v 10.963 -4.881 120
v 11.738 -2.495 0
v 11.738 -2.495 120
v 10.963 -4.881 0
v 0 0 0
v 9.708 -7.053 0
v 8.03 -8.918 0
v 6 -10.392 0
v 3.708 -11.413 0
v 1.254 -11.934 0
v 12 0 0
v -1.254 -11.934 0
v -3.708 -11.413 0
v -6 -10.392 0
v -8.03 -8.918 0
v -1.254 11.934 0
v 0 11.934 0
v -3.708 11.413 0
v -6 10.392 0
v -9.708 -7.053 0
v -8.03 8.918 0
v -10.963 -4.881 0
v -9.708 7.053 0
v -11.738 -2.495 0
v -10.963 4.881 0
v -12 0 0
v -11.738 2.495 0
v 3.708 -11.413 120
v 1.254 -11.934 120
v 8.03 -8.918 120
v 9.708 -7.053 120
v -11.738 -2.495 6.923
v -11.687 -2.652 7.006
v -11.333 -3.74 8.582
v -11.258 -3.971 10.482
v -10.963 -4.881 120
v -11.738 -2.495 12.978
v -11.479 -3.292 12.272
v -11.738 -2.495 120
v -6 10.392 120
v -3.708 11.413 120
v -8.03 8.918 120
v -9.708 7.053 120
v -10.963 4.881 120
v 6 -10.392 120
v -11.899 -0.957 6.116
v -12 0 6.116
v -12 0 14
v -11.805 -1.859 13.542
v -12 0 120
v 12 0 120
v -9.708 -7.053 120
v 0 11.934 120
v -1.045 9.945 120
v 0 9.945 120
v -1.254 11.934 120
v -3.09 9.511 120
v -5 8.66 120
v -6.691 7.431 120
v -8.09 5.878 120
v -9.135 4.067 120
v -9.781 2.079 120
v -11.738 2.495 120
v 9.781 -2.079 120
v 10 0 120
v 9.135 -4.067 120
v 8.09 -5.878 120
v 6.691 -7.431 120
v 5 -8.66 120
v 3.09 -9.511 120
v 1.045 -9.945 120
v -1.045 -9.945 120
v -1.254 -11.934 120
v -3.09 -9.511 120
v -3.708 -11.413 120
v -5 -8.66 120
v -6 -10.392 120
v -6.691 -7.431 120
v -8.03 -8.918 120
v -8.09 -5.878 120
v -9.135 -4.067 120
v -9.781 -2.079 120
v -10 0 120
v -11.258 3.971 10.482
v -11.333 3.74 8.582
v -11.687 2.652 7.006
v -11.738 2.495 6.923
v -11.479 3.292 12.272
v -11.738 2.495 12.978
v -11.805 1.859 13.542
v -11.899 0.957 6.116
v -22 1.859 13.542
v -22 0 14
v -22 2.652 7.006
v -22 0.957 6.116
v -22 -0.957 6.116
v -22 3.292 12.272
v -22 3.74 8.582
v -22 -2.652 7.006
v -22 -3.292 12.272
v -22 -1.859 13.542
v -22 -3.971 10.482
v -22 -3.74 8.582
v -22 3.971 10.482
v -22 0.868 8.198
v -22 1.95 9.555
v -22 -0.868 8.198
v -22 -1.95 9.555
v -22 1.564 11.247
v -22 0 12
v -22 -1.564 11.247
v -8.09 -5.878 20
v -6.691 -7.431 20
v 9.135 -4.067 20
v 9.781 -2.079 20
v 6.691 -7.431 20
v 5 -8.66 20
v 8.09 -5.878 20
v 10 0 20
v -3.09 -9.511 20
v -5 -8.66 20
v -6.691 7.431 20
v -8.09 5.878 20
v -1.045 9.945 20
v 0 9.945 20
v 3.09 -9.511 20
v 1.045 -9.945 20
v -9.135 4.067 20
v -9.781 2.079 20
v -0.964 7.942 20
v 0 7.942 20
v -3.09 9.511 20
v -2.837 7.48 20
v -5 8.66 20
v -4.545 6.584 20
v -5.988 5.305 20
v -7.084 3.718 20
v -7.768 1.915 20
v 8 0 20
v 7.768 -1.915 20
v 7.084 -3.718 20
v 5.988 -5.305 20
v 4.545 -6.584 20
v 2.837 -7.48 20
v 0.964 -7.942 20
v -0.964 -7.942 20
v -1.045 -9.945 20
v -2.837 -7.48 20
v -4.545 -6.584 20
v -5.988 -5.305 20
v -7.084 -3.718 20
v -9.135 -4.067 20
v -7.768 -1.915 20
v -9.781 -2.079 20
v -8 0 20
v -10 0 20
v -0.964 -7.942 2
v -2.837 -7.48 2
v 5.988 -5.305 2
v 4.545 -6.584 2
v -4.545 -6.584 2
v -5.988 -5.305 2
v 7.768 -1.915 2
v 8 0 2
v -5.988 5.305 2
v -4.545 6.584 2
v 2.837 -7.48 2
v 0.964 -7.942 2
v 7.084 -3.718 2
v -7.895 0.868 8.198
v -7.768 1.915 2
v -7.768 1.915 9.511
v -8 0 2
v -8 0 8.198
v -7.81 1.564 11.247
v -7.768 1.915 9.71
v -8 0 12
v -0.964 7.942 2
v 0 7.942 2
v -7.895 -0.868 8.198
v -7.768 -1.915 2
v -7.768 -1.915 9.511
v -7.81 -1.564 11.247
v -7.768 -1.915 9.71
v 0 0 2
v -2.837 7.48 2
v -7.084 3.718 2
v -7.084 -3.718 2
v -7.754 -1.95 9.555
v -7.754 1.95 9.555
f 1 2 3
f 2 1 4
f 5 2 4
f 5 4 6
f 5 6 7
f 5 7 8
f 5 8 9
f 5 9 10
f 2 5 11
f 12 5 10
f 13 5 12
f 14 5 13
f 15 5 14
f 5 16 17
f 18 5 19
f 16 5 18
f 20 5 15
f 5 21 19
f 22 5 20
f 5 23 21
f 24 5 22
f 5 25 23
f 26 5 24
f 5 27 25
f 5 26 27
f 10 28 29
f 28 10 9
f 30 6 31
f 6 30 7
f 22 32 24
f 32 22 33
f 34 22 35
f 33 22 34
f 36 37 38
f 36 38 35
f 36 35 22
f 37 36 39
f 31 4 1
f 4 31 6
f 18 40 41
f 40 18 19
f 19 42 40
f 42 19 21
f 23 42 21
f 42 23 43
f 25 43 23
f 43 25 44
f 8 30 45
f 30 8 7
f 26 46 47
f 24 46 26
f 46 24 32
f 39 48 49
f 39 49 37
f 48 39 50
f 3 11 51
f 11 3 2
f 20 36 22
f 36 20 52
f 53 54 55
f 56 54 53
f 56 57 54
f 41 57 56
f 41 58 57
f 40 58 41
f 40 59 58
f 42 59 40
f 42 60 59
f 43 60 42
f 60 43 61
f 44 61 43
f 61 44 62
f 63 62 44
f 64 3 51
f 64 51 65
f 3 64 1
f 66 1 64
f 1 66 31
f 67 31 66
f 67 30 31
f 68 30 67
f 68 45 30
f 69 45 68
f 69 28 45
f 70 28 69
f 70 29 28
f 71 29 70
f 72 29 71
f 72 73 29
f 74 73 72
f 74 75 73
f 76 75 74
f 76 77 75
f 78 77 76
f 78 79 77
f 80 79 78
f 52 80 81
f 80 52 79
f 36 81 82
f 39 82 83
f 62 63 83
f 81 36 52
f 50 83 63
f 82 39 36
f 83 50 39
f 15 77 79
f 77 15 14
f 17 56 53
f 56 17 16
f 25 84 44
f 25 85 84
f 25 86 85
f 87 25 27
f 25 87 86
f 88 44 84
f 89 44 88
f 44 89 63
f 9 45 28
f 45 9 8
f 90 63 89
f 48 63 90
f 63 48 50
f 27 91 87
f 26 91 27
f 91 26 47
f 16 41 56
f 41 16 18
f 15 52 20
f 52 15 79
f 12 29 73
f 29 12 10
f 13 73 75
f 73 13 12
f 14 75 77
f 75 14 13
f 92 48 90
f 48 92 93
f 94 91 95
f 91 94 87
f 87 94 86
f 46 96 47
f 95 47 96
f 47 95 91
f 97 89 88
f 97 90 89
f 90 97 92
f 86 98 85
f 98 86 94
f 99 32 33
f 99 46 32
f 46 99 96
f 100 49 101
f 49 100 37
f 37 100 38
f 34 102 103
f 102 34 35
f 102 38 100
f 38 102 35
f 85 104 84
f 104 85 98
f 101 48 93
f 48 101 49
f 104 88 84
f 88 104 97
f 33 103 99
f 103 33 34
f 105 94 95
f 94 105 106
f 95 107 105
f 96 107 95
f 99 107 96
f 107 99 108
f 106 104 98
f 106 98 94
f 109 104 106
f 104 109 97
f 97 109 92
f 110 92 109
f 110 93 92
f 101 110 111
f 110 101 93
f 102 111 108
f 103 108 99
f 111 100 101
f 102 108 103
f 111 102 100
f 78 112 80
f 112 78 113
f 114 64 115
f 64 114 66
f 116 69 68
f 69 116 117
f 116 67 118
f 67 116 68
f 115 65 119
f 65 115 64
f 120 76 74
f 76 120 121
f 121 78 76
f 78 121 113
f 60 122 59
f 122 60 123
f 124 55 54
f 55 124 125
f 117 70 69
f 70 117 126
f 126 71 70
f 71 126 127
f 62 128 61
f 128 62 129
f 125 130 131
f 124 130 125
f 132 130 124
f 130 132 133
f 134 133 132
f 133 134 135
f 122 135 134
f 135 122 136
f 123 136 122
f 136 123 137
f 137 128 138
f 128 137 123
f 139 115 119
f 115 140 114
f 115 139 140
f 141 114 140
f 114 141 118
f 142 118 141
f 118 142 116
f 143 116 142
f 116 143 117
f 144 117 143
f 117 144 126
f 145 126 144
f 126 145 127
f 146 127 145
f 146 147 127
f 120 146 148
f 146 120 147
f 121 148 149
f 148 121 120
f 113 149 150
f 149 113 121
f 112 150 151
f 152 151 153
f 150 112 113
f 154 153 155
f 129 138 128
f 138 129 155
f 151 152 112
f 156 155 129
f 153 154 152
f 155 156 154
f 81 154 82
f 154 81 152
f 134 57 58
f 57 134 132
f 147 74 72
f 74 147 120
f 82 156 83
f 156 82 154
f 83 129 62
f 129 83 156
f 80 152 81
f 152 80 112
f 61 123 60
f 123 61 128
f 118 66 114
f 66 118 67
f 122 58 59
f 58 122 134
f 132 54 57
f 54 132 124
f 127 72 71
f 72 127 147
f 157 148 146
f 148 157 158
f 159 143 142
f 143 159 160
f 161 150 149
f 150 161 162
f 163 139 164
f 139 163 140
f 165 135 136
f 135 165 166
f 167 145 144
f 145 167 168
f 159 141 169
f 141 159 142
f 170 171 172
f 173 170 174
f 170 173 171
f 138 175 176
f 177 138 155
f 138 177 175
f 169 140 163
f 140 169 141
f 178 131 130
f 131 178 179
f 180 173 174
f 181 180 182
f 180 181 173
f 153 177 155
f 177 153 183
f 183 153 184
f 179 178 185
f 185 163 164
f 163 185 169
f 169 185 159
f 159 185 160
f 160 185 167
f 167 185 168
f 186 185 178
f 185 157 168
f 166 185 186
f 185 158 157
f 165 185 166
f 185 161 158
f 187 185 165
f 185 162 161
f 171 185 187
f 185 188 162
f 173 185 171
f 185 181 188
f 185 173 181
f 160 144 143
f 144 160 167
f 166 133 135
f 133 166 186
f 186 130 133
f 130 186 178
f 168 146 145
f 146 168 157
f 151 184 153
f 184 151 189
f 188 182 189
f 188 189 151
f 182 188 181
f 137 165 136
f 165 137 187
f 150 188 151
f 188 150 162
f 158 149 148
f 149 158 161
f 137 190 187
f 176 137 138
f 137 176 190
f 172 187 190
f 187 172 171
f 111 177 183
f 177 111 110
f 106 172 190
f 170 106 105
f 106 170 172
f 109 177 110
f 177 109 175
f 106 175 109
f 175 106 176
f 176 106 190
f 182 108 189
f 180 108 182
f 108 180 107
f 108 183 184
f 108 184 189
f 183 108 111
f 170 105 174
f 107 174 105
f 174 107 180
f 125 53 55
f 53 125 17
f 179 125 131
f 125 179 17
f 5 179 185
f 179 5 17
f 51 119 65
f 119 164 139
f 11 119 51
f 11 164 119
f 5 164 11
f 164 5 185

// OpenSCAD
module piston(piston_r, piston_way, stab_width, hole_r, nozzle_len, nozzle_hole_r){
  cyl_r = piston_r*1.2;
  side_width = piston_r*0.2;
  difference(){
    union(){  
      cylinder(h=piston_way + stab_width
        , r=cyl_r
        , center = false
      );
      
      translate([0,0,stab_width/2])
      rotate([0,-90,0])
      cylinder(h=cyl_r+nozzle_len
        , r=nozzle_hole_r+2
        , center = false
      );   
    }
    translate([0,0,stab_width])
    cylinder(h=piston_way+1, r=piston_r, center = false);
    
    translate([0,0,side_width])  
    cylinder(h=stab_width+side_width+2, r=hole_r, center = false); 

    translate([0,0,stab_width/2])
    rotate([0,-90,0])
    cylinder(h=cyl_r+nozzle_len+1
      , r=nozzle_hole_r
      , center = false
    );     
  }
}

difference(){
piston(piston_r = 10
    , piston_way = 100
    , stab_width = 20
    , hole_r = 8
    , nozzle_len=10
    , nozzle_hole_r = 2
    );
translate([0,0,-1])
cube([18,18,150]);  
}
